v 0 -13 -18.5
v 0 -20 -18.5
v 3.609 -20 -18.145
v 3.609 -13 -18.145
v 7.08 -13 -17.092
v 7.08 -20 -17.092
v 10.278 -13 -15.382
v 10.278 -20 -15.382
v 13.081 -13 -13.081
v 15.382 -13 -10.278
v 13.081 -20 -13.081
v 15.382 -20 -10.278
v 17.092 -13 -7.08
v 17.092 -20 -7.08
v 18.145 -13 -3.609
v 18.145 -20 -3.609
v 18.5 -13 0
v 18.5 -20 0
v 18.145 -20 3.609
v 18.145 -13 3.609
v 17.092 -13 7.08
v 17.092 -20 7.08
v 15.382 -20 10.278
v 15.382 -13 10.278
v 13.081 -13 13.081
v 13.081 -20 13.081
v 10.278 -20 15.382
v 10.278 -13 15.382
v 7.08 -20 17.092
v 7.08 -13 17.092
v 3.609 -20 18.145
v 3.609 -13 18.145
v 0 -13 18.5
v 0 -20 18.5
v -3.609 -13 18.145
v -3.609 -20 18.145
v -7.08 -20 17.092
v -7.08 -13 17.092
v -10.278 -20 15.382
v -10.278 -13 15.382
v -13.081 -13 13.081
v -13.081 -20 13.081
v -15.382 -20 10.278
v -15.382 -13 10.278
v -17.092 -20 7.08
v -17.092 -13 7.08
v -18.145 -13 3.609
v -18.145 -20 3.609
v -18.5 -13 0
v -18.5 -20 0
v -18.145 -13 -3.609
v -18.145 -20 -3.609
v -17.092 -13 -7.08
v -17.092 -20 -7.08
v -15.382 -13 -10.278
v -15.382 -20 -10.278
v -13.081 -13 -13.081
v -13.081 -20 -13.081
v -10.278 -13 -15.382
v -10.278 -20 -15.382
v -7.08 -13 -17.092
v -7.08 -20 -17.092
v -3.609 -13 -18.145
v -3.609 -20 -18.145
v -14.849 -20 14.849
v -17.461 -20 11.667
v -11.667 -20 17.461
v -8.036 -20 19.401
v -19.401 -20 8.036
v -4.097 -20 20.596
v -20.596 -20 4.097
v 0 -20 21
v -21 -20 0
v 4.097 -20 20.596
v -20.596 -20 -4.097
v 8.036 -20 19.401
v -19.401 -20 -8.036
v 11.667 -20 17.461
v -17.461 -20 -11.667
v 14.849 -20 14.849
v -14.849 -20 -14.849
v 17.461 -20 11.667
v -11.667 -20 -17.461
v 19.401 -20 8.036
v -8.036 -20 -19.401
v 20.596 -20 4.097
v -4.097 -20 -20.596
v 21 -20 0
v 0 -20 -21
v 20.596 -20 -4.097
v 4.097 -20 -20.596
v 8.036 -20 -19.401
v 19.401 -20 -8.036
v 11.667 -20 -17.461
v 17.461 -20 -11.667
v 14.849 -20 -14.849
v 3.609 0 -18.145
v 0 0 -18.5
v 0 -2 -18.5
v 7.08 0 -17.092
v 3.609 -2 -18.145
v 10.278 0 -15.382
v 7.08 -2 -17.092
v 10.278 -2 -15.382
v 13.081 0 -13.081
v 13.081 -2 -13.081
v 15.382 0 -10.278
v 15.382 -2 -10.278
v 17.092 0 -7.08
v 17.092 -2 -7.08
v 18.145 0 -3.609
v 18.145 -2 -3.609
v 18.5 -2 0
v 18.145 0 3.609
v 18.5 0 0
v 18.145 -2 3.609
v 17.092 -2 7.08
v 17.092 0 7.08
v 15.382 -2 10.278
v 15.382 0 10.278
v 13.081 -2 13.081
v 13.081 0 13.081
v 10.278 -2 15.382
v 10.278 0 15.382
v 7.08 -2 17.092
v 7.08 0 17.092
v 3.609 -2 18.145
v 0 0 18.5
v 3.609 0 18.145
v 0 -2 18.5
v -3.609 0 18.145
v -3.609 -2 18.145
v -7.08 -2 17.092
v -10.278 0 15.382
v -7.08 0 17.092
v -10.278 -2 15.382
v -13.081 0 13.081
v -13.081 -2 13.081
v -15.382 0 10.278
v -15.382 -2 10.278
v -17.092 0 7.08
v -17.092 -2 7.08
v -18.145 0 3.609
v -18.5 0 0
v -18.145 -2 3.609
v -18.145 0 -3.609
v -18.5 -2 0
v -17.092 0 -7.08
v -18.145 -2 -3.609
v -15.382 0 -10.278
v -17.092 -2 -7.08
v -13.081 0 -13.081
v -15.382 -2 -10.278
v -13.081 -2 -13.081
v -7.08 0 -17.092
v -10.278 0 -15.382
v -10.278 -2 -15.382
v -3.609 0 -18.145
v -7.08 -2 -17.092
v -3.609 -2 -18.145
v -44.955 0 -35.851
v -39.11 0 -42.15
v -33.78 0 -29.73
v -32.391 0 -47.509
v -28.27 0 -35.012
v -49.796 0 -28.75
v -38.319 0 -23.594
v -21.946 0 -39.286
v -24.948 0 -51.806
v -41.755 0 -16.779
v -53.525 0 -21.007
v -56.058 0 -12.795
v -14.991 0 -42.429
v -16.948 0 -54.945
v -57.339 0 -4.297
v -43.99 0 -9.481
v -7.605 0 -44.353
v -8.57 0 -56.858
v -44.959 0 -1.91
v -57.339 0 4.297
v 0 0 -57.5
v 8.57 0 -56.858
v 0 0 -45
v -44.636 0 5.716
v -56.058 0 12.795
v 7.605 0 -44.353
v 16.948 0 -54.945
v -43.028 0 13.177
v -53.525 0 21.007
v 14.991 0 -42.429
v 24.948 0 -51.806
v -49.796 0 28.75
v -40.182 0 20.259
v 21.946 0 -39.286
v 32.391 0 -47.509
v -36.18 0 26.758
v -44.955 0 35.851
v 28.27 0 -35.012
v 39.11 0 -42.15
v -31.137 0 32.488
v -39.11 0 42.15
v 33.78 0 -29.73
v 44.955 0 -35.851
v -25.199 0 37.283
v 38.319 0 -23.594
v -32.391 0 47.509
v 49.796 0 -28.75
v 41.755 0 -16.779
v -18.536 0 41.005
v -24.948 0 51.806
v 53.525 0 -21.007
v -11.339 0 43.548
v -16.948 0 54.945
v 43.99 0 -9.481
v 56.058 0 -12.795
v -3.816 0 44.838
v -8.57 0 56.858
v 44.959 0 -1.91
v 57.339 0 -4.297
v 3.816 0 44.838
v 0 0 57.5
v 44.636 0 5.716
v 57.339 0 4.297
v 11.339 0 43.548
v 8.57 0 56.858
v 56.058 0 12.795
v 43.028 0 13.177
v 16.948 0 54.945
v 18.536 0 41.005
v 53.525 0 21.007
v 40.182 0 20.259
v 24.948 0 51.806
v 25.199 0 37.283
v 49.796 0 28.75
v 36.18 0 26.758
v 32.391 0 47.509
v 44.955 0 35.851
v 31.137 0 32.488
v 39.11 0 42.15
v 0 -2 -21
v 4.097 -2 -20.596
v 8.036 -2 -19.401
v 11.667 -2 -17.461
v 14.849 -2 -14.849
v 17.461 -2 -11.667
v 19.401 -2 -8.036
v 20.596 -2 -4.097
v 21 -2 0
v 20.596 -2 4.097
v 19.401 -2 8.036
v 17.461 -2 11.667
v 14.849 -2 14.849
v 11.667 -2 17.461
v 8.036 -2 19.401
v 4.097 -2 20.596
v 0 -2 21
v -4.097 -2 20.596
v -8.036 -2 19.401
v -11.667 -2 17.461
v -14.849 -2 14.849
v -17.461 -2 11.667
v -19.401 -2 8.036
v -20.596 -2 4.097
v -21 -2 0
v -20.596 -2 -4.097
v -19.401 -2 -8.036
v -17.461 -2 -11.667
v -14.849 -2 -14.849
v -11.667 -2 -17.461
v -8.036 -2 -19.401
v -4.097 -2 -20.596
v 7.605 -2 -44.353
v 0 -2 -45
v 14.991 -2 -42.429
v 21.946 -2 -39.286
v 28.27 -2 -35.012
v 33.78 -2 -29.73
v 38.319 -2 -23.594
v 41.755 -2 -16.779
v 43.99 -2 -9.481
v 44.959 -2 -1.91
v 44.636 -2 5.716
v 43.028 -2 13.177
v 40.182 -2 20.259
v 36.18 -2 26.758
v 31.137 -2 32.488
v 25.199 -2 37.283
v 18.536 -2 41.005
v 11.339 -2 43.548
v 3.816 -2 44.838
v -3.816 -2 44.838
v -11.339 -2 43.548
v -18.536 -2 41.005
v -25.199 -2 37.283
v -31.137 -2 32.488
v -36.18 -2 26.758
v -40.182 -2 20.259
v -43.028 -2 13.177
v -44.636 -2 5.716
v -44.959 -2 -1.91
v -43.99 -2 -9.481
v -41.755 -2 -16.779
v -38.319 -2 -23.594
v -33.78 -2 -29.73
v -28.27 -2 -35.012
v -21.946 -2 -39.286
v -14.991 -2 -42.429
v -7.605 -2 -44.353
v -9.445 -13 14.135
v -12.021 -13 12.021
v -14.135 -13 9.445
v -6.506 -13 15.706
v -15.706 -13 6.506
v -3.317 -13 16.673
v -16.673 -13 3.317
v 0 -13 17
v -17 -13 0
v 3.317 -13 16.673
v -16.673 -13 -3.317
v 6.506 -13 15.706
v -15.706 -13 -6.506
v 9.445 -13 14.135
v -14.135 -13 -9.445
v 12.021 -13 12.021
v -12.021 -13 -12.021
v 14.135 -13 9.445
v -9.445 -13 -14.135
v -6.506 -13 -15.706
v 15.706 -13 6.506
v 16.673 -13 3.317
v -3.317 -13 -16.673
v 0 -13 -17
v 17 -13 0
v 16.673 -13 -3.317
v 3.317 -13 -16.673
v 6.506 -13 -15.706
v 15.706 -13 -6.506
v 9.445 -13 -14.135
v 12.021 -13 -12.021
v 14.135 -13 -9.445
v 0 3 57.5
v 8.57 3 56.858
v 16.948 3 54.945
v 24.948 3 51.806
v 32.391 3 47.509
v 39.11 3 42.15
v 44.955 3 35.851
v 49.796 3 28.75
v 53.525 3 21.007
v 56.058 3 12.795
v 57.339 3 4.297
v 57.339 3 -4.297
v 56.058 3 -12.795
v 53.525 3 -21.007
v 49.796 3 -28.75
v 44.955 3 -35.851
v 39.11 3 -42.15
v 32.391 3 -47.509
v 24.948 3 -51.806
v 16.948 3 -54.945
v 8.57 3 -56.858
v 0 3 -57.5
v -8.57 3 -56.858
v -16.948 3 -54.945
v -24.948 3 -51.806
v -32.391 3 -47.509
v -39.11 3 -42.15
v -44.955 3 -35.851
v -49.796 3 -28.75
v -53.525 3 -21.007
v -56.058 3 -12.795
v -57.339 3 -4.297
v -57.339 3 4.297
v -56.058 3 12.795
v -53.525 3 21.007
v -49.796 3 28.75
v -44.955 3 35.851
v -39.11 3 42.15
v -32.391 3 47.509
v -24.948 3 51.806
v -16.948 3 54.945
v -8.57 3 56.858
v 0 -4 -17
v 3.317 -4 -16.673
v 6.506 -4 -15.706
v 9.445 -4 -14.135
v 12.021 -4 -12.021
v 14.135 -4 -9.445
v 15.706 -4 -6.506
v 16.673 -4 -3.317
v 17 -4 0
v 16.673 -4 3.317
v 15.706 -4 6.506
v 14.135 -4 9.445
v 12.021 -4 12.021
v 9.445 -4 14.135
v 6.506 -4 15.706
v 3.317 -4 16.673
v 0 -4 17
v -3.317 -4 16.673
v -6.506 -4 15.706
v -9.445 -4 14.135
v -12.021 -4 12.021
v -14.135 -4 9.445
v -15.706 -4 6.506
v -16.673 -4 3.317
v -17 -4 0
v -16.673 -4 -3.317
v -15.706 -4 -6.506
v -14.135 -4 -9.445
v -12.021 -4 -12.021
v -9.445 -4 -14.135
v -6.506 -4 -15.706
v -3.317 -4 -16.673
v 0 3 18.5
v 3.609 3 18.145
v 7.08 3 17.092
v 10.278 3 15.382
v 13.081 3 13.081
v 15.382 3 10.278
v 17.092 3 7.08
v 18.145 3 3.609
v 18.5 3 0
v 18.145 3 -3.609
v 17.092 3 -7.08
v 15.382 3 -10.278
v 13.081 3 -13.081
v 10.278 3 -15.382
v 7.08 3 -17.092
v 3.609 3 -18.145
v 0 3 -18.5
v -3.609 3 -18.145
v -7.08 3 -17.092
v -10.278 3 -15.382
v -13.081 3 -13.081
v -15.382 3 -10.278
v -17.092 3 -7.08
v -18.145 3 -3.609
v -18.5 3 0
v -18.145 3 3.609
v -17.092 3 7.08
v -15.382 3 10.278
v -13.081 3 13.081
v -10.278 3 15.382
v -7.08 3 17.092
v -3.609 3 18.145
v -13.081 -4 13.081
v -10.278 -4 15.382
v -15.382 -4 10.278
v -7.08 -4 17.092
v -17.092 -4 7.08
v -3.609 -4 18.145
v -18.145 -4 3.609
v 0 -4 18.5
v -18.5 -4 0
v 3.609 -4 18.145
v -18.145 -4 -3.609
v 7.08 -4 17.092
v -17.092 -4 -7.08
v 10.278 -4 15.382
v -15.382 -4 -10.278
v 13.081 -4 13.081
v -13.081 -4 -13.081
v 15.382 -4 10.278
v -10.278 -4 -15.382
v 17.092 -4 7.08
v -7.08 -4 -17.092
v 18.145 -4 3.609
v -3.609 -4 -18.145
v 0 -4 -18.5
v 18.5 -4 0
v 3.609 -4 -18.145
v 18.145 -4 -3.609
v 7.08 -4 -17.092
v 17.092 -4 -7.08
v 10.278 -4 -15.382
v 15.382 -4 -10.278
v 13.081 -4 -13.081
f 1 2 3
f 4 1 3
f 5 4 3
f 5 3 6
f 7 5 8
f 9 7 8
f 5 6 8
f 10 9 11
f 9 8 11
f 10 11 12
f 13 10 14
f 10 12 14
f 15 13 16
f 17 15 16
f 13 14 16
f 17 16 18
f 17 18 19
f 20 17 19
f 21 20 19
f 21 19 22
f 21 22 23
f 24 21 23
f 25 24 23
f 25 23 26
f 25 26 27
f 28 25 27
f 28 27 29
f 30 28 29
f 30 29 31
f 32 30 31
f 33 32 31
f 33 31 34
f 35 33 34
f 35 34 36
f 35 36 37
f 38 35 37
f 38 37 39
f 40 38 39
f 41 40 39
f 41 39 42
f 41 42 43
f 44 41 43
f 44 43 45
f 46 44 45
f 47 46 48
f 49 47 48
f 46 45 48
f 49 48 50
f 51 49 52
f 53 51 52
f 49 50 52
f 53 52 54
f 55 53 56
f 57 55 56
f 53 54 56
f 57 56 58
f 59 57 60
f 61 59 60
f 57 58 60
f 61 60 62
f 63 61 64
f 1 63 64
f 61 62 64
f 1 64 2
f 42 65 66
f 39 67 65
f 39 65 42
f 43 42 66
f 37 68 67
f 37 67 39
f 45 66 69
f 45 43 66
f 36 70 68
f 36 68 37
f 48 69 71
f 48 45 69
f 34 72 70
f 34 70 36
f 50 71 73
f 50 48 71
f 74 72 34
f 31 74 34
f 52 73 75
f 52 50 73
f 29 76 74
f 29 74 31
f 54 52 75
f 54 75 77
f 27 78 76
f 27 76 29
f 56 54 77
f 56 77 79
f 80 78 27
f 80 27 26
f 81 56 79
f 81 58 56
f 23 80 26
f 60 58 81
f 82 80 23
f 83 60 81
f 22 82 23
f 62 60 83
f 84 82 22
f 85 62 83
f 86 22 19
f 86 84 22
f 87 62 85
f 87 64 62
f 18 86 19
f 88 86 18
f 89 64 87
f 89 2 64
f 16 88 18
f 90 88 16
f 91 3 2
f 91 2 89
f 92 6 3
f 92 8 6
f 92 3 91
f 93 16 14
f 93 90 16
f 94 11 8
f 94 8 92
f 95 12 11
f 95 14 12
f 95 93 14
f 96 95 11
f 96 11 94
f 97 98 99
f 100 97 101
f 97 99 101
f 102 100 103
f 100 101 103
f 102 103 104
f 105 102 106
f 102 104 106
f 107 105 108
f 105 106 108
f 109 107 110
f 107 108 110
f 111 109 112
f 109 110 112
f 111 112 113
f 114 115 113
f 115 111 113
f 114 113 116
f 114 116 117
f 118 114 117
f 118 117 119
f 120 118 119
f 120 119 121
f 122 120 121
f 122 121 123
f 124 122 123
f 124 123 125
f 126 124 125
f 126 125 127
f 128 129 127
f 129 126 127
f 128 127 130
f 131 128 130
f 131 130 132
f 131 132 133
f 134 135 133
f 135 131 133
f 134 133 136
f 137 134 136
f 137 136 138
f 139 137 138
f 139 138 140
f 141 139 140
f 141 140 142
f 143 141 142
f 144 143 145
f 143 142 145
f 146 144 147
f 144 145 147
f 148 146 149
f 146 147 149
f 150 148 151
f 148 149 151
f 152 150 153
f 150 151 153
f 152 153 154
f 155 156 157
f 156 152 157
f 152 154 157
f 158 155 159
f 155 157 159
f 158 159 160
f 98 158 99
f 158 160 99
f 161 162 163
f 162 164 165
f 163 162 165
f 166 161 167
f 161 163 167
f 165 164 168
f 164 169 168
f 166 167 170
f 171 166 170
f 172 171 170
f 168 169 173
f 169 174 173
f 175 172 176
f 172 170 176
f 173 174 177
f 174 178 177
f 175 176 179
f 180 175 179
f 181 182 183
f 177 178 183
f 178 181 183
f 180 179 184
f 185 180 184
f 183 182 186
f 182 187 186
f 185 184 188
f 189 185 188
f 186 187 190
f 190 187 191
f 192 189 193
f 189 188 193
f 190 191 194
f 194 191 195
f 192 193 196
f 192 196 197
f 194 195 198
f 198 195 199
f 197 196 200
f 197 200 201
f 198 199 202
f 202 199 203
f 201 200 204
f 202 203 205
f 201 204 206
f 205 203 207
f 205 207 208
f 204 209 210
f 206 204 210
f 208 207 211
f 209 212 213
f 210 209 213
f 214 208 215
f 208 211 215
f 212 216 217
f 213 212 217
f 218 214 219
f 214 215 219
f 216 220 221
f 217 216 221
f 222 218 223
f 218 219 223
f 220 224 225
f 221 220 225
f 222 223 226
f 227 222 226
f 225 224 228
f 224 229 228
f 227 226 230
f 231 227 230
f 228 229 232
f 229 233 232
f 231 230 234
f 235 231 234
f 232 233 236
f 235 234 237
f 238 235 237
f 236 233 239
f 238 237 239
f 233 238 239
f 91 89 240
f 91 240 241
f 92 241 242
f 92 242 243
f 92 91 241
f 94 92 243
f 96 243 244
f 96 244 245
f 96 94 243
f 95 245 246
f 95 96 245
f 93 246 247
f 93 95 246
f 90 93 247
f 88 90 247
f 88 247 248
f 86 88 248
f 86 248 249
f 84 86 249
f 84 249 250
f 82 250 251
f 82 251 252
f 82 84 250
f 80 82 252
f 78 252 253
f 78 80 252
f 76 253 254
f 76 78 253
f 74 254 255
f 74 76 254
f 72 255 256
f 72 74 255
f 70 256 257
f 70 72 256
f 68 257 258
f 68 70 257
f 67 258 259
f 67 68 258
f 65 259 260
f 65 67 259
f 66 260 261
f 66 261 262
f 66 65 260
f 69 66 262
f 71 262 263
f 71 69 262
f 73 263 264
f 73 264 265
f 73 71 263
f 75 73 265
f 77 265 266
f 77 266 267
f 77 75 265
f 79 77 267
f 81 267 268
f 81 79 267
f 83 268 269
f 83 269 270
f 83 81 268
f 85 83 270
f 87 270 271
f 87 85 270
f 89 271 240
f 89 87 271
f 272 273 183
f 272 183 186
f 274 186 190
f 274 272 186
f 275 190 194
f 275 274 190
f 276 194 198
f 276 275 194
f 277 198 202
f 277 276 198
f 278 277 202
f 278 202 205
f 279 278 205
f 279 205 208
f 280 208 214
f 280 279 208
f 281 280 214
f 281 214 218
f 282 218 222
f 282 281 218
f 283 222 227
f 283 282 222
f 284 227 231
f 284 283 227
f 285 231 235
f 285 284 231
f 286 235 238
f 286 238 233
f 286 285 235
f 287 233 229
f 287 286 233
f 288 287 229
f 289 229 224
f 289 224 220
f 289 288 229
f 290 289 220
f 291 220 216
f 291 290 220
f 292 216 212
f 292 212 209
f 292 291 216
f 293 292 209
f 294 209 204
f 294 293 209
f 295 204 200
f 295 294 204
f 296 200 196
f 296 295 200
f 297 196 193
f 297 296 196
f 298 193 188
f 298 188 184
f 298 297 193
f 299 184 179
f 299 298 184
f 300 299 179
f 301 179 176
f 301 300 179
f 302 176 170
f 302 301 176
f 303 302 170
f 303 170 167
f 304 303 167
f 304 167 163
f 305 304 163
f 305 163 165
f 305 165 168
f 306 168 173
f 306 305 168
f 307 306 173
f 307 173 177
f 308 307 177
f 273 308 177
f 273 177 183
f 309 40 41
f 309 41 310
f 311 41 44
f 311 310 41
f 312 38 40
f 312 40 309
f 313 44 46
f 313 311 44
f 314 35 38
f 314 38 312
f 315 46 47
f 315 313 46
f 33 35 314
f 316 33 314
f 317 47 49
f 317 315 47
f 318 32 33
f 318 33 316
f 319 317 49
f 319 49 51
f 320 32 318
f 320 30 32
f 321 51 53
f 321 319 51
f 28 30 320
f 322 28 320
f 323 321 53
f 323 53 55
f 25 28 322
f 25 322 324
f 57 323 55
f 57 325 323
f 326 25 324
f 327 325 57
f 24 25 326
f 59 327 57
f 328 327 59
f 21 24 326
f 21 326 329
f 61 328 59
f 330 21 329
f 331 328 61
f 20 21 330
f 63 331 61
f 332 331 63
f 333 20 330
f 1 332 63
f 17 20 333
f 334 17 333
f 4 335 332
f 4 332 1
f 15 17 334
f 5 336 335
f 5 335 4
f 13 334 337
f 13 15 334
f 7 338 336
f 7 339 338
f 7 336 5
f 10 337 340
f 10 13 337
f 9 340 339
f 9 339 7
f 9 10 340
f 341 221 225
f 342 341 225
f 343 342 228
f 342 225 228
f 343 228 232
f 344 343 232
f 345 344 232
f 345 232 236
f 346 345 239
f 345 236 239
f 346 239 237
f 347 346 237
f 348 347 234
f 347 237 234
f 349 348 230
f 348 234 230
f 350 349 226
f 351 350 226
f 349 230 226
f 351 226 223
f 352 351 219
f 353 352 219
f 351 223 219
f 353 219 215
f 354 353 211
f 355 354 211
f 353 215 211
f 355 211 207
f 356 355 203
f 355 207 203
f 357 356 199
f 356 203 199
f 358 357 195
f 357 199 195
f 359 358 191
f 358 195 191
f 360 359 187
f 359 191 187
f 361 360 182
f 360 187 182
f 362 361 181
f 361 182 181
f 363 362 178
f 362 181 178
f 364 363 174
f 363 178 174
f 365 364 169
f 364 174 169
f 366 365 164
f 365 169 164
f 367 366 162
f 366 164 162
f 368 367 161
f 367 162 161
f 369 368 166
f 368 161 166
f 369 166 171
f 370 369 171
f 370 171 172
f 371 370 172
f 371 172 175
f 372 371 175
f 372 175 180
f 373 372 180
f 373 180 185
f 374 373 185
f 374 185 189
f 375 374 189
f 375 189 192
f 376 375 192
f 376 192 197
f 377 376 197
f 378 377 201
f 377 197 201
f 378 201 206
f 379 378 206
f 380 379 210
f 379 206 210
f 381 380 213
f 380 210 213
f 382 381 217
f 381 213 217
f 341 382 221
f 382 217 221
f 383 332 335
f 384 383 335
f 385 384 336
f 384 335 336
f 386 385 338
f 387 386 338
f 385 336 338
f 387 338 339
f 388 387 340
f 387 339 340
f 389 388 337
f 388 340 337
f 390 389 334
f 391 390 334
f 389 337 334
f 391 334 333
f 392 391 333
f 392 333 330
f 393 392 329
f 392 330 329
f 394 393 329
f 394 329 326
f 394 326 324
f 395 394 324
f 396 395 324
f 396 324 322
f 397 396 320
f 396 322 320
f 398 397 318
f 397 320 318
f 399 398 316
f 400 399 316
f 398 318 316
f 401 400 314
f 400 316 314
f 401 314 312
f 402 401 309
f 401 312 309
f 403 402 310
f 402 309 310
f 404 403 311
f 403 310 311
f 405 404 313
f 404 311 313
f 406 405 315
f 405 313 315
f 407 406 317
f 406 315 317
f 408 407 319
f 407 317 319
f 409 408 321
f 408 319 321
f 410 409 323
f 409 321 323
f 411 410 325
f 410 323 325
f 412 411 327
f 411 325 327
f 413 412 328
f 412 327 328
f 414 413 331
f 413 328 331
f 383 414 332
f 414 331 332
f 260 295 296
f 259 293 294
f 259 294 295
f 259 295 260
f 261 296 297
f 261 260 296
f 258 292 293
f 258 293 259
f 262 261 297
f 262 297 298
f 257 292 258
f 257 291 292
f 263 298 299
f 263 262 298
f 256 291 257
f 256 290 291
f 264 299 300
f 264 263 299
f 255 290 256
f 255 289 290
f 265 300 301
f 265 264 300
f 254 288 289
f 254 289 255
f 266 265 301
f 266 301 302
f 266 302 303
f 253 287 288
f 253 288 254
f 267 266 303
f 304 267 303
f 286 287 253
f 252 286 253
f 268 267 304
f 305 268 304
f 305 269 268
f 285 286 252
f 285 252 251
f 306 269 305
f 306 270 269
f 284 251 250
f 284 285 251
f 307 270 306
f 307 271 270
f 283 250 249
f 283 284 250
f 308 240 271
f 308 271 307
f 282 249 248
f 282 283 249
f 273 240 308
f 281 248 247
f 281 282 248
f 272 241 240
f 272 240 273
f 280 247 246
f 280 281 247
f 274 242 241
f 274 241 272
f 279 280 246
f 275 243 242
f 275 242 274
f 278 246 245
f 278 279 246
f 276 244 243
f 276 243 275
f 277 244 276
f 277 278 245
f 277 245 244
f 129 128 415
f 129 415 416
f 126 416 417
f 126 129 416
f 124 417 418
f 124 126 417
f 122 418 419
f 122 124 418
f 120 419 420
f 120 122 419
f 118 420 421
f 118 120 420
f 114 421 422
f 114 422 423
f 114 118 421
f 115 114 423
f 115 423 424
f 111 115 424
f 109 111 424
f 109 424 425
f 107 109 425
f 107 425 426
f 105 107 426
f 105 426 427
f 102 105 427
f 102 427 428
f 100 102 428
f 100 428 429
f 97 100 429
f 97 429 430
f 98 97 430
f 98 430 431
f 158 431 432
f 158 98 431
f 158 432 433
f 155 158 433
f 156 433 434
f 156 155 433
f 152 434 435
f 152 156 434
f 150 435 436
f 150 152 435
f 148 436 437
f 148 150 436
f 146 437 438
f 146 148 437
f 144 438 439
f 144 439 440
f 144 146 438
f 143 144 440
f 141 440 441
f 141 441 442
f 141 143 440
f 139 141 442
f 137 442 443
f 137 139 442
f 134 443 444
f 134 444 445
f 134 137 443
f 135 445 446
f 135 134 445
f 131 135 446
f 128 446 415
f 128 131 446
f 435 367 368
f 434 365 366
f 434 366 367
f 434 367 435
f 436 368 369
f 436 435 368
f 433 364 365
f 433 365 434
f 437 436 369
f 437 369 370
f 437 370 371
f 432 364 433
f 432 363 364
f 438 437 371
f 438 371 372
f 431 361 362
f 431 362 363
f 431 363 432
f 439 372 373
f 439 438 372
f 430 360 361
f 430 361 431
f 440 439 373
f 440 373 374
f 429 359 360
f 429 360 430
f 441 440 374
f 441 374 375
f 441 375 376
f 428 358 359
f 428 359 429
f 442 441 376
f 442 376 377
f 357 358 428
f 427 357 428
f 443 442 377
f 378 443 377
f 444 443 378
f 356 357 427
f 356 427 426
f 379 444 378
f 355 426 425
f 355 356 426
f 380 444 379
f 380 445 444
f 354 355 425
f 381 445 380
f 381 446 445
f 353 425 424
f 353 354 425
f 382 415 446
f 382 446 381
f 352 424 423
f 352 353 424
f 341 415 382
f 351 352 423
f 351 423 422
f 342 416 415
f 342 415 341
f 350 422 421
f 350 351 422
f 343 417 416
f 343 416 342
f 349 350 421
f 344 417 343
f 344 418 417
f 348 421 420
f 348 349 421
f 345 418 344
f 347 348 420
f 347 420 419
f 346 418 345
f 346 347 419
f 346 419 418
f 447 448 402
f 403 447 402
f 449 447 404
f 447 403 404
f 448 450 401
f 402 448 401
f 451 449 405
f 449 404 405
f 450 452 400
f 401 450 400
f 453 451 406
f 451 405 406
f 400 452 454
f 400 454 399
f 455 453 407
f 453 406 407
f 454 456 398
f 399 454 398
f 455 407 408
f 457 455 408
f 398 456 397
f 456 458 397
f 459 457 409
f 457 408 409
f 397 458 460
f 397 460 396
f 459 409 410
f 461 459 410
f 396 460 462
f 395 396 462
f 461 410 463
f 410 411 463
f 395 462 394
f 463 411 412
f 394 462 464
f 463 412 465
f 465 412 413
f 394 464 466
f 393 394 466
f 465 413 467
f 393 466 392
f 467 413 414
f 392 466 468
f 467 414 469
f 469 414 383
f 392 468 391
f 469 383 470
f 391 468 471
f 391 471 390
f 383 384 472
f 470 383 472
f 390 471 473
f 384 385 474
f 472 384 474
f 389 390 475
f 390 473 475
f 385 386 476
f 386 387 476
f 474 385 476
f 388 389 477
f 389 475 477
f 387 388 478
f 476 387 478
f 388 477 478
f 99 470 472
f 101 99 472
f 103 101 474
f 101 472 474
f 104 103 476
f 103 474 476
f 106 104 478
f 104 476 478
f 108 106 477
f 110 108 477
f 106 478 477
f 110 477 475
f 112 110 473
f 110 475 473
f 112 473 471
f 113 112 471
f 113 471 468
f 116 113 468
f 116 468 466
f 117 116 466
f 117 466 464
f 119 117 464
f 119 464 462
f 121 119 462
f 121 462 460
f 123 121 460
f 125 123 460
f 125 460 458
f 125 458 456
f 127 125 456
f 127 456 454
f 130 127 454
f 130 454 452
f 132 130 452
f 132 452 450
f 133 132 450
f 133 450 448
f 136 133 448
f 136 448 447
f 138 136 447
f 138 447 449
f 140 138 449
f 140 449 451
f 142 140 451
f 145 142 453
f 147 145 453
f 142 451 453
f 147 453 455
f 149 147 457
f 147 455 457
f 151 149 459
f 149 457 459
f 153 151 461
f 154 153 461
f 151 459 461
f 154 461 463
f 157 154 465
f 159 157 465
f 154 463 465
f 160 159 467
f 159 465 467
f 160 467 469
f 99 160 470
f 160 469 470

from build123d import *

# Parameters (mm, degrees)
SKETCH1_R           = 57.5
SKETCH1_R_2         = 18.5
BOSS_EXTRUDE1_DEPTH = 3
BOSS_EXTRUDE2_START = 2
SKETCH2_R           = 45
SKETCH2_R_2         = 18.5
BOSS_EXTRUDE2_DEPTH = 2
BOSS_EXTRUDE3_START = 18
SKETCH3_R           = 21
SKETCH3_R_2         = 18.5
BOSS_EXTRUDE3_DEPTH = 18
BOSS_EXTRUDE4_START = -7
SKETCH4_R           = 18.5
SKETCH4_R_2         = 17
BOSS_EXTRUDE4_DEPTH = 9


with BuildPart() as part:
    # Sketch1 → Boss-Extrude1 (new body)
    with BuildSketch(Plane(origin=(0, 0, 0), x_dir=(1, 0, 0), z_dir=(0, 1, 0))):
        Circle(SKETCH1_R)
        Circle(SKETCH1_R_2, mode=Mode.SUBTRACT)
    extrude(amount=BOSS_EXTRUDE1_DEPTH)

    # Sketch2 → Boss-Extrude2 (add)
    with BuildSketch(Plane.XZ.offset(BOSS_EXTRUDE2_START)):
        Circle(SKETCH2_R)
        Circle(SKETCH2_R_2, mode=Mode.SUBTRACT)
    extrude(amount=-BOSS_EXTRUDE2_DEPTH)

    # Sketch3 → Boss-Extrude3 (add)
    with BuildSketch(Plane.XZ.offset(2).offset(BOSS_EXTRUDE3_START)):
        Circle(SKETCH3_R)
        Circle(SKETCH3_R_2, mode=Mode.SUBTRACT)
    extrude(amount=-BOSS_EXTRUDE3_DEPTH)

    # Sketch4 → Boss-Extrude4 (add)
    with BuildSketch(Plane.XZ.offset(20).offset(BOSS_EXTRUDE4_START)):
        Circle(SKETCH4_R)
        Circle(SKETCH4_R_2, mode=Mode.SUBTRACT)
    extrude(amount=-BOSS_EXTRUDE4_DEPTH)


solid = part.part
